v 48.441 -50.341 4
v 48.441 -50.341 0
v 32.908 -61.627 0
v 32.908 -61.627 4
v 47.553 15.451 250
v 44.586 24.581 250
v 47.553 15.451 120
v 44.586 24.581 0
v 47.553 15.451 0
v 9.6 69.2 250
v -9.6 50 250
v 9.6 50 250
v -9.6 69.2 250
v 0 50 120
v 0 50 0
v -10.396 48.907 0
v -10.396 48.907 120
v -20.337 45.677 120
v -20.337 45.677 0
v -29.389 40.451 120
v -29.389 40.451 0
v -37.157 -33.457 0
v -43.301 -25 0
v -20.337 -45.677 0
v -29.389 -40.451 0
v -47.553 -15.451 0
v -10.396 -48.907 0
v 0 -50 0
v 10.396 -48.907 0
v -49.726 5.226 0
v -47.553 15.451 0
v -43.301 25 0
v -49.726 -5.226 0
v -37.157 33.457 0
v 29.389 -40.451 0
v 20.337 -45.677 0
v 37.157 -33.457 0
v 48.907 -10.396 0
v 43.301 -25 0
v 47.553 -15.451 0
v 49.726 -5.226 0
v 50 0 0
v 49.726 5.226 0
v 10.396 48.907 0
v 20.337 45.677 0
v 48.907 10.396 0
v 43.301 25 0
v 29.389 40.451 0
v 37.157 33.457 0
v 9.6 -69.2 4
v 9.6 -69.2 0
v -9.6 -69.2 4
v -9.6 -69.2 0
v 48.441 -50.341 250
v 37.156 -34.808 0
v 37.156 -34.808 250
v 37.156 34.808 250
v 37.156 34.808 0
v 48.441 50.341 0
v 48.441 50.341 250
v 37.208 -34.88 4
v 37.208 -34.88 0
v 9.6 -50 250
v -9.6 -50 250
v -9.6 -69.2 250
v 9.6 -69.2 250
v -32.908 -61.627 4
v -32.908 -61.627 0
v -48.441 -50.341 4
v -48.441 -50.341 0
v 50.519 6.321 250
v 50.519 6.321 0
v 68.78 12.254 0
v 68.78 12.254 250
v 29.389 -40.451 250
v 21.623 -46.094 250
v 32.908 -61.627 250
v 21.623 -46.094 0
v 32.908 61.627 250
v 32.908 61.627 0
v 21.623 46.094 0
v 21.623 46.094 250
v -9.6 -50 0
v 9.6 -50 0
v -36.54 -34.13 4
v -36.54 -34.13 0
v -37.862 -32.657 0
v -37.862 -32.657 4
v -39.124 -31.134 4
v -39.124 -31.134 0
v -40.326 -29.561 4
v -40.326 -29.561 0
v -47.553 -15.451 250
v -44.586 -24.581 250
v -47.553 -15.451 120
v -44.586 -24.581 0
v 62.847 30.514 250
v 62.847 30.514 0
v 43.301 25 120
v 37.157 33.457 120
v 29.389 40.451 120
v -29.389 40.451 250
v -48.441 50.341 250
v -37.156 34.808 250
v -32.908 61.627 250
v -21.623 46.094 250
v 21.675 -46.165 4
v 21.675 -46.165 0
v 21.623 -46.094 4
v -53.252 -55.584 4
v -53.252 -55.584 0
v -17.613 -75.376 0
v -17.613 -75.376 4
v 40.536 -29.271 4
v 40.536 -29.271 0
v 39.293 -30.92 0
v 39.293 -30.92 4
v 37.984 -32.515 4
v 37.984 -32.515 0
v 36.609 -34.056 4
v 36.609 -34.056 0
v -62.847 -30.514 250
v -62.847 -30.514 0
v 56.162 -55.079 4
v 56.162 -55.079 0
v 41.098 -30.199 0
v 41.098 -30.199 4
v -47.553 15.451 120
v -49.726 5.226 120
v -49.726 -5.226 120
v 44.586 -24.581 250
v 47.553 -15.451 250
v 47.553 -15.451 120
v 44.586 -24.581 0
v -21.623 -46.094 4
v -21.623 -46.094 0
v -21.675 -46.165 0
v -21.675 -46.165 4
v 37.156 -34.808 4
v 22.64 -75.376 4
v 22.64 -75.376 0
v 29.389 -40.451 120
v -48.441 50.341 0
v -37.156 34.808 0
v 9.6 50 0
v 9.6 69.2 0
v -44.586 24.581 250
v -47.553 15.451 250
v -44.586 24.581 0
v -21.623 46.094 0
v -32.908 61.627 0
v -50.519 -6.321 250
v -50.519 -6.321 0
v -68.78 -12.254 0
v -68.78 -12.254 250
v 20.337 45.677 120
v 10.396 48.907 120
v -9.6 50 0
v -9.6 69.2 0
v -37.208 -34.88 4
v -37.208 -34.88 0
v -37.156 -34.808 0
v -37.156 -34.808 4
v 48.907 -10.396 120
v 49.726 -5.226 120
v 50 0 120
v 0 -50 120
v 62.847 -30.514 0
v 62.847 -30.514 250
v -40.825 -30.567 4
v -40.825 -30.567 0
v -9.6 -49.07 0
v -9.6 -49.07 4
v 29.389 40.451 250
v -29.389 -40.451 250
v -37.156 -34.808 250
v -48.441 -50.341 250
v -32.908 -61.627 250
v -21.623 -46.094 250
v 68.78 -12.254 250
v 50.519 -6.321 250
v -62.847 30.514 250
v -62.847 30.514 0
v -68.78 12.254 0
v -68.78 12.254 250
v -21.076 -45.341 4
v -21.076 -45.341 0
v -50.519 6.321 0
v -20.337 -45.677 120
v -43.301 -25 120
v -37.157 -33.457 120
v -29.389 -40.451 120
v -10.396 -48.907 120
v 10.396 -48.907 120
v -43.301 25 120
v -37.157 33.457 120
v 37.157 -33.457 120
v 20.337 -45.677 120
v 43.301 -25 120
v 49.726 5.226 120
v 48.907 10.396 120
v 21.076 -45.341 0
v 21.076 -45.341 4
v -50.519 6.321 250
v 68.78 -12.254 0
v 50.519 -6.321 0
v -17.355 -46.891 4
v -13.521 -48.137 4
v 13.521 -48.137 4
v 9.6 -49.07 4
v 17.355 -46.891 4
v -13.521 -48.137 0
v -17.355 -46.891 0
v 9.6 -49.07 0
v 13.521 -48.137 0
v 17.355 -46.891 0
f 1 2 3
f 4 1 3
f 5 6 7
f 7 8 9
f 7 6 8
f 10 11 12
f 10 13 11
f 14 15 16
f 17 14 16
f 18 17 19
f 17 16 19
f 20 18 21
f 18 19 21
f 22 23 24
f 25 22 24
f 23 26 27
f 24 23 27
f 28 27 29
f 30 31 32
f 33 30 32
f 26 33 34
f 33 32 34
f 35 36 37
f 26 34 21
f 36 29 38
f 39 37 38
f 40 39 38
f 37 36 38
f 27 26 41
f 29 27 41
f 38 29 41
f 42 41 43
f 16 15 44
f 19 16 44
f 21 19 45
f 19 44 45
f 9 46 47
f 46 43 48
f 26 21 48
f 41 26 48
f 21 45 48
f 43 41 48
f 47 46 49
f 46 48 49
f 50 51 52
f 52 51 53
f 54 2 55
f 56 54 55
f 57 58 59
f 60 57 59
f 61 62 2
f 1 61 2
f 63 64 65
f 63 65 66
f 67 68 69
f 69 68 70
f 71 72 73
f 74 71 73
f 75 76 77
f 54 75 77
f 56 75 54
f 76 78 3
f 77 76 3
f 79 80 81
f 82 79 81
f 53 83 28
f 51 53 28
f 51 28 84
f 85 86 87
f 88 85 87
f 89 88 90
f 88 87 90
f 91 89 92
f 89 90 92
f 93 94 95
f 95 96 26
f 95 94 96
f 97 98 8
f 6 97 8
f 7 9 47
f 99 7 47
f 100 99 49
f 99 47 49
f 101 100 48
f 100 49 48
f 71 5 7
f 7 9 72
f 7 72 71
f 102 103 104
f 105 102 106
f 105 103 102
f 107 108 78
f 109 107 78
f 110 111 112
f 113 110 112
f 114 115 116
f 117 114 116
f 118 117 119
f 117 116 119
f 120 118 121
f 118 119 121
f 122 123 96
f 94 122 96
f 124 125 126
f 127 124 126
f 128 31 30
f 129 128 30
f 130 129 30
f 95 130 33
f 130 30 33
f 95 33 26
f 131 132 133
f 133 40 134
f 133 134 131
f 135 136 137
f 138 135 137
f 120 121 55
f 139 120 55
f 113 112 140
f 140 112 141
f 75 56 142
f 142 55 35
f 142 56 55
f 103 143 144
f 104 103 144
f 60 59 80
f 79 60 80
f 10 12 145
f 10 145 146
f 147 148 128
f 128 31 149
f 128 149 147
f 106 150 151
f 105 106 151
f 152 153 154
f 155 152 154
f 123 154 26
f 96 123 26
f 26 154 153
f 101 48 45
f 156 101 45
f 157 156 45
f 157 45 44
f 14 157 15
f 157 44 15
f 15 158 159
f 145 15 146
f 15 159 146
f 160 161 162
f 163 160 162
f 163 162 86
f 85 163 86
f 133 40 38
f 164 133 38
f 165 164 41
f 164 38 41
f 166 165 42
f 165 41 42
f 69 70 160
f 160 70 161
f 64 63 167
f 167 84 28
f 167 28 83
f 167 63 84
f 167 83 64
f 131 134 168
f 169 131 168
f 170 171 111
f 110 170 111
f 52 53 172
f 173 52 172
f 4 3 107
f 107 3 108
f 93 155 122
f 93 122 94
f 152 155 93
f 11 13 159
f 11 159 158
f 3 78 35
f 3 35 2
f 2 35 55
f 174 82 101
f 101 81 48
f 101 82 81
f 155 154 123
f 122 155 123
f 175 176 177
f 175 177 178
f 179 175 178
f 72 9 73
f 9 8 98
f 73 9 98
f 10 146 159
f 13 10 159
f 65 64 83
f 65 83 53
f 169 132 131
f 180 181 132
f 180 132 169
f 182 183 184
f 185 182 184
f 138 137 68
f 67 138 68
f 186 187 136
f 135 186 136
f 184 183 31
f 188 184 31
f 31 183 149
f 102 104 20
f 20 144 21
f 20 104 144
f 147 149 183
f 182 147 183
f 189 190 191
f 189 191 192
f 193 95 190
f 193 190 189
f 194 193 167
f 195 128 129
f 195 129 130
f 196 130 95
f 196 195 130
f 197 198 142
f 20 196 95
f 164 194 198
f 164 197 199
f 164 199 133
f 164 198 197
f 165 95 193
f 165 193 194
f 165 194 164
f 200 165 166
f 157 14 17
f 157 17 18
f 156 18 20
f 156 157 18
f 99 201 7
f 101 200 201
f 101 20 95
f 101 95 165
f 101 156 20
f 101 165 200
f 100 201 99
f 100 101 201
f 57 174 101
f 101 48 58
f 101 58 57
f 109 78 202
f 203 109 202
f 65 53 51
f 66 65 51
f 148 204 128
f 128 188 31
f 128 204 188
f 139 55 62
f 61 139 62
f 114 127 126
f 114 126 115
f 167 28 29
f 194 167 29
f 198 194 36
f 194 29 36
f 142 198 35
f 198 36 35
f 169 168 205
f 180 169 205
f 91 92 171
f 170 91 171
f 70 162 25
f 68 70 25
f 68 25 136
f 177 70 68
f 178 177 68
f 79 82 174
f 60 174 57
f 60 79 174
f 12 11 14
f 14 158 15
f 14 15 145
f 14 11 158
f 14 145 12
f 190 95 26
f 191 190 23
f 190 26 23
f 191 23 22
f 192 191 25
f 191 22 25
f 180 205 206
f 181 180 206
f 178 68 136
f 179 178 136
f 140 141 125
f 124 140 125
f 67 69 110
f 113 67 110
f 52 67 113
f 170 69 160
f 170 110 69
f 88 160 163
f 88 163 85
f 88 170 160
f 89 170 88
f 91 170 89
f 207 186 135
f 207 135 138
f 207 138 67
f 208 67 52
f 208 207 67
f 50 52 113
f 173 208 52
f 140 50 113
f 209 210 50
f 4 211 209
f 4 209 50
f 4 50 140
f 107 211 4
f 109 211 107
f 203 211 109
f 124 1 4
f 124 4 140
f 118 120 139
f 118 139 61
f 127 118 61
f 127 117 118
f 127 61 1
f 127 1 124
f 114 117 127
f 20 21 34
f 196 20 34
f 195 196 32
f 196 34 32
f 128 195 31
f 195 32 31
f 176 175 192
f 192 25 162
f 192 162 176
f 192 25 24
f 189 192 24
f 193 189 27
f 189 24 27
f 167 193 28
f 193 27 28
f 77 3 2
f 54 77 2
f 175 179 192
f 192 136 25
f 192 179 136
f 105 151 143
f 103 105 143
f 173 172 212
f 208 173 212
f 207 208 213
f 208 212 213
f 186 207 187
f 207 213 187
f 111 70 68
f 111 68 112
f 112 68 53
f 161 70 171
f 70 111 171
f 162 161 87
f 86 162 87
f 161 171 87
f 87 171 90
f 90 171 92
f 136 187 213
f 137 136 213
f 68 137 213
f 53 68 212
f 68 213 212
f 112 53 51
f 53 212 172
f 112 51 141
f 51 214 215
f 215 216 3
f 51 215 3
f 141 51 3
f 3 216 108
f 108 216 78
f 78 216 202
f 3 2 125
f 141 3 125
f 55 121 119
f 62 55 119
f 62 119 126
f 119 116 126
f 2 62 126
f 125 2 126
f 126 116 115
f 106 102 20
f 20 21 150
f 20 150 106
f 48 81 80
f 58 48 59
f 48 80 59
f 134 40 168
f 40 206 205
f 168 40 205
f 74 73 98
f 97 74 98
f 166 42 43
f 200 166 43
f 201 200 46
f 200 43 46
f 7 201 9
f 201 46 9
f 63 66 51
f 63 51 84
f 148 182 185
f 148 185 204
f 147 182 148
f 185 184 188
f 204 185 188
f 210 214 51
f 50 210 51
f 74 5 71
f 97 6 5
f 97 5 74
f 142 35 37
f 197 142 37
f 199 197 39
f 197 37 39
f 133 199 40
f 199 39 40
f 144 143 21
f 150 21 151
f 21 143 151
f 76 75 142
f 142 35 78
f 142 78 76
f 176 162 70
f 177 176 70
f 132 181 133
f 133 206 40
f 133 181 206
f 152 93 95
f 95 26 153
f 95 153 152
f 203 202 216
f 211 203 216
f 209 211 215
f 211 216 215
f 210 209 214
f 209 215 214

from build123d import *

# Parameters (mm, degrees)
F1_DEPTH = 120
F2_DEPTH = 250
F4_DEPTH = 4


# Not quite as in the source:
# - a feature names something its author has since deleted; it is built from what else it names


with BuildPart() as f1:
    # F0 (on Top) → F1 (new body)
    with BuildSketch(Plane.XY):
        with BuildLine():
            ThreePointArc((47.5528258507, -15.4508496082), (49.3844170388, -7.8217231946), (50, 0))
            ThreePointArc((50, 0), (49.3844170388, 7.8217231946), (47.5528258507, 15.4508496082))
            ThreePointArc((47.5528258507, 15.4508496082), (40.4508495047, 29.3892629092), (29.3892619315, 40.450850215))
            ThreePointArc((29.3892619315, 40.450850215), (15.4508493172, 47.5528259452), (0, 50))
            ThreePointArc((0, 50), (-15.450849525, 47.5528258777), (-29.389262285, 40.4508499582))
            ThreePointArc((-29.389262285, 40.4508499582), (-40.4508495406, 29.3892628598), (-47.5528257534, 15.4508499077))
            ThreePointArc((-47.5528257534, 15.4508499077), (-50, 5.095e-07), (-47.5528260682, -15.4508489386))
            ThreePointArc((-47.5528260682, -15.4508489386), (-40.4508501628, -29.3892620034), (-29.3892631734, -40.4508493128))
            ThreePointArc((-29.3892631734, -40.4508493128), (-15.4508500472, -47.552825708), (0, -50))
            ThreePointArc((0, -50), (15.4508493172, -47.5528259452), (29.3892619315, -40.4508502151))
            ThreePointArc((29.3892619315, -40.4508502151), (40.4508495047, -29.3892629092), (47.5528258507, -15.4508496082))
        make_face()
    extrude(amount=F1_DEPTH)

    # F0 (on Top) → F2 (join)
    with BuildSketch(Plane.XY):
        Polygon((-21.6226994686, -46.0935881408), (-29.3892631734, -40.4508493128), (-37.1558257606, -34.8081112967), (-48.4413026046, -50.3412375887), (-32.9081763126, -61.6267144328), align=None)
        Polygon((-44.5862626688, -24.5809922752), (-47.5528260682, -15.4508489386), (-50.5193889608, -6.3207071623), (-68.7796740736, -12.2538334543), (-62.8465477816, -30.5141185672), align=None)
        Polygon((9.6, -50), (0, -50), (-9.6, -50), (-9.6, -69.2), (9.6, -69.2), align=None)
        Polygon((37.1558257606, -34.8081112967), (29.3892619315, -40.4508502151), (21.6226994686, -46.0935881408), (32.9081763126, -61.6267144328), (48.4413026046, -50.3412375887), align=None)
        Polygon((50.5193889608, -6.3207071623), (47.5528258507, -15.4508496082), (44.5862626688, -24.5809922752), (62.8465477816, -30.5141185672), (68.7796740736, -12.2538334543), align=None)
        Polygon((44.5862626688, 24.5809922752), (47.5528258507, 15.4508496082), (50.5193889608, 6.3207071623), (68.7796740736, 12.2538334543), (62.8465477816, 30.5141185672), align=None)
        Polygon((21.6226994686, 46.0935881408), (29.3892619315, 40.450850215), (37.1558257606, 34.8081112967), (48.4413026046, 50.3412375887), (32.9081763126, 61.6267144328), align=None)
        Polygon((-9.6, 50), (0, 50), (9.6, 50), (9.6, 69.2), (-9.6, 69.2), align=None)
        Polygon((-37.1558257606, 34.8081112967), (-29.389262285, 40.4508499582), (-21.6226994686, 46.0935881408), (-32.9081763126, 61.6267144328), (-48.4413026046, 50.3412375887), align=None)
        Polygon((-50.5193889608, 6.3207071623), (-47.5528257534, 15.4508499077), (-44.5862626688, 24.5809922752), (-62.8465477816, 30.5141185672), (-68.7796740736, 12.2538334543), align=None)
    extrude(amount=F2_DEPTH)


with BuildPart() as f4:
    # F3 (on Top) → F4 (new body)
    with BuildSketch(Plane.XY):
        with BuildLine():
            ThreePointArc((-36.5395719078, -34.1300407969), (-38.5003757753, -31.9017407858), (-40.3255031982, -29.5610181119))
            Line((-40.3255031982, -29.5610181119), (-40.8250220898, -30.5666087646))
            Line((-40.8250220898, -30.5666087646), (-53.2520930962, -55.5837735933))
            Line((-53.2520930962, -55.5837735933), (-17.6129629184, -75.3755012347))
            Line((-17.6129629184, -75.3755012347), (22.63964626, -75.3755012347))
            Line((22.63964626, -75.3755012347), (56.161962921, -55.0787862979))
            Line((56.161962921, -55.0787862979), (41.0978779096, -30.1987488371))
            Line((41.0978779096, -30.1987488371), (40.5363164273, -29.2712666365))
            ThreePointArc((40.5363164273, -29.2712666365), (38.646780385, -31.7242236449), (36.6090363432, -34.0555202283))
            Line((36.6090363432, -34.0555202283), (37.1558257606, -34.8081112967))
            Line((37.1558257606, -34.8081112967), (37.2077401251, -34.8795652895))
            Line((37.2077401251, -34.8795652895), (48.4413026046, -50.3412375887))
            Line((48.4413026046, -50.3412375887), (32.9081763126, -61.6267144328))
            Line((32.9081763126, -61.6267144328), (21.6746138331, -46.1650421335))
            Line((21.6746138331, -46.1650421335), (21.6226994686, -46.0935881408))
            Line((21.6226994686, -46.0935881408), (21.0759100512, -45.3409970723))
            ThreePointArc((21.0759100512, -45.3409970723), (15.4508497187, -47.5528258148), (9.6, -49.0697462802))
            Line((9.6, -49.0697462802), (9.6, -50))
            Line((9.6, -50), (9.6, -69.2))
            Line((9.6, -69.2), (-9.6, -69.2))
            Line((-9.6, -69.2), (-9.6, -50))
            Line((-9.6, -50), (-9.6, -49.0697462802))
            ThreePointArc((-9.6, -49.0697462802), (-15.4508497187, -47.5528258148), (-21.0759100512, -45.3409970723))
            Line((-21.0759100512, -45.3409970723), (-21.6226994686, -46.0935881408))
            Line((-21.6226994686, -46.0935881408), (-21.6746138331, -46.1650421335))
            Line((-21.6746138331, -46.1650421335), (-32.9081763126, -61.6267144328))
            Line((-32.9081763126, -61.6267144328), (-48.4413026046, -50.3412375887))
            Line((-48.4413026046, -50.3412375887), (-37.2077401251, -34.8795652895))
            Line((-37.2077401251, -34.8795652895), (-37.1558257606, -34.8081112967))
            Line((-37.1558257606, -34.8081112967), (-36.5395719078, -34.1300407969))
        make_face()
    extrude(amount=F4_DEPTH)


solid = Compound([f1.part, f4.part])
